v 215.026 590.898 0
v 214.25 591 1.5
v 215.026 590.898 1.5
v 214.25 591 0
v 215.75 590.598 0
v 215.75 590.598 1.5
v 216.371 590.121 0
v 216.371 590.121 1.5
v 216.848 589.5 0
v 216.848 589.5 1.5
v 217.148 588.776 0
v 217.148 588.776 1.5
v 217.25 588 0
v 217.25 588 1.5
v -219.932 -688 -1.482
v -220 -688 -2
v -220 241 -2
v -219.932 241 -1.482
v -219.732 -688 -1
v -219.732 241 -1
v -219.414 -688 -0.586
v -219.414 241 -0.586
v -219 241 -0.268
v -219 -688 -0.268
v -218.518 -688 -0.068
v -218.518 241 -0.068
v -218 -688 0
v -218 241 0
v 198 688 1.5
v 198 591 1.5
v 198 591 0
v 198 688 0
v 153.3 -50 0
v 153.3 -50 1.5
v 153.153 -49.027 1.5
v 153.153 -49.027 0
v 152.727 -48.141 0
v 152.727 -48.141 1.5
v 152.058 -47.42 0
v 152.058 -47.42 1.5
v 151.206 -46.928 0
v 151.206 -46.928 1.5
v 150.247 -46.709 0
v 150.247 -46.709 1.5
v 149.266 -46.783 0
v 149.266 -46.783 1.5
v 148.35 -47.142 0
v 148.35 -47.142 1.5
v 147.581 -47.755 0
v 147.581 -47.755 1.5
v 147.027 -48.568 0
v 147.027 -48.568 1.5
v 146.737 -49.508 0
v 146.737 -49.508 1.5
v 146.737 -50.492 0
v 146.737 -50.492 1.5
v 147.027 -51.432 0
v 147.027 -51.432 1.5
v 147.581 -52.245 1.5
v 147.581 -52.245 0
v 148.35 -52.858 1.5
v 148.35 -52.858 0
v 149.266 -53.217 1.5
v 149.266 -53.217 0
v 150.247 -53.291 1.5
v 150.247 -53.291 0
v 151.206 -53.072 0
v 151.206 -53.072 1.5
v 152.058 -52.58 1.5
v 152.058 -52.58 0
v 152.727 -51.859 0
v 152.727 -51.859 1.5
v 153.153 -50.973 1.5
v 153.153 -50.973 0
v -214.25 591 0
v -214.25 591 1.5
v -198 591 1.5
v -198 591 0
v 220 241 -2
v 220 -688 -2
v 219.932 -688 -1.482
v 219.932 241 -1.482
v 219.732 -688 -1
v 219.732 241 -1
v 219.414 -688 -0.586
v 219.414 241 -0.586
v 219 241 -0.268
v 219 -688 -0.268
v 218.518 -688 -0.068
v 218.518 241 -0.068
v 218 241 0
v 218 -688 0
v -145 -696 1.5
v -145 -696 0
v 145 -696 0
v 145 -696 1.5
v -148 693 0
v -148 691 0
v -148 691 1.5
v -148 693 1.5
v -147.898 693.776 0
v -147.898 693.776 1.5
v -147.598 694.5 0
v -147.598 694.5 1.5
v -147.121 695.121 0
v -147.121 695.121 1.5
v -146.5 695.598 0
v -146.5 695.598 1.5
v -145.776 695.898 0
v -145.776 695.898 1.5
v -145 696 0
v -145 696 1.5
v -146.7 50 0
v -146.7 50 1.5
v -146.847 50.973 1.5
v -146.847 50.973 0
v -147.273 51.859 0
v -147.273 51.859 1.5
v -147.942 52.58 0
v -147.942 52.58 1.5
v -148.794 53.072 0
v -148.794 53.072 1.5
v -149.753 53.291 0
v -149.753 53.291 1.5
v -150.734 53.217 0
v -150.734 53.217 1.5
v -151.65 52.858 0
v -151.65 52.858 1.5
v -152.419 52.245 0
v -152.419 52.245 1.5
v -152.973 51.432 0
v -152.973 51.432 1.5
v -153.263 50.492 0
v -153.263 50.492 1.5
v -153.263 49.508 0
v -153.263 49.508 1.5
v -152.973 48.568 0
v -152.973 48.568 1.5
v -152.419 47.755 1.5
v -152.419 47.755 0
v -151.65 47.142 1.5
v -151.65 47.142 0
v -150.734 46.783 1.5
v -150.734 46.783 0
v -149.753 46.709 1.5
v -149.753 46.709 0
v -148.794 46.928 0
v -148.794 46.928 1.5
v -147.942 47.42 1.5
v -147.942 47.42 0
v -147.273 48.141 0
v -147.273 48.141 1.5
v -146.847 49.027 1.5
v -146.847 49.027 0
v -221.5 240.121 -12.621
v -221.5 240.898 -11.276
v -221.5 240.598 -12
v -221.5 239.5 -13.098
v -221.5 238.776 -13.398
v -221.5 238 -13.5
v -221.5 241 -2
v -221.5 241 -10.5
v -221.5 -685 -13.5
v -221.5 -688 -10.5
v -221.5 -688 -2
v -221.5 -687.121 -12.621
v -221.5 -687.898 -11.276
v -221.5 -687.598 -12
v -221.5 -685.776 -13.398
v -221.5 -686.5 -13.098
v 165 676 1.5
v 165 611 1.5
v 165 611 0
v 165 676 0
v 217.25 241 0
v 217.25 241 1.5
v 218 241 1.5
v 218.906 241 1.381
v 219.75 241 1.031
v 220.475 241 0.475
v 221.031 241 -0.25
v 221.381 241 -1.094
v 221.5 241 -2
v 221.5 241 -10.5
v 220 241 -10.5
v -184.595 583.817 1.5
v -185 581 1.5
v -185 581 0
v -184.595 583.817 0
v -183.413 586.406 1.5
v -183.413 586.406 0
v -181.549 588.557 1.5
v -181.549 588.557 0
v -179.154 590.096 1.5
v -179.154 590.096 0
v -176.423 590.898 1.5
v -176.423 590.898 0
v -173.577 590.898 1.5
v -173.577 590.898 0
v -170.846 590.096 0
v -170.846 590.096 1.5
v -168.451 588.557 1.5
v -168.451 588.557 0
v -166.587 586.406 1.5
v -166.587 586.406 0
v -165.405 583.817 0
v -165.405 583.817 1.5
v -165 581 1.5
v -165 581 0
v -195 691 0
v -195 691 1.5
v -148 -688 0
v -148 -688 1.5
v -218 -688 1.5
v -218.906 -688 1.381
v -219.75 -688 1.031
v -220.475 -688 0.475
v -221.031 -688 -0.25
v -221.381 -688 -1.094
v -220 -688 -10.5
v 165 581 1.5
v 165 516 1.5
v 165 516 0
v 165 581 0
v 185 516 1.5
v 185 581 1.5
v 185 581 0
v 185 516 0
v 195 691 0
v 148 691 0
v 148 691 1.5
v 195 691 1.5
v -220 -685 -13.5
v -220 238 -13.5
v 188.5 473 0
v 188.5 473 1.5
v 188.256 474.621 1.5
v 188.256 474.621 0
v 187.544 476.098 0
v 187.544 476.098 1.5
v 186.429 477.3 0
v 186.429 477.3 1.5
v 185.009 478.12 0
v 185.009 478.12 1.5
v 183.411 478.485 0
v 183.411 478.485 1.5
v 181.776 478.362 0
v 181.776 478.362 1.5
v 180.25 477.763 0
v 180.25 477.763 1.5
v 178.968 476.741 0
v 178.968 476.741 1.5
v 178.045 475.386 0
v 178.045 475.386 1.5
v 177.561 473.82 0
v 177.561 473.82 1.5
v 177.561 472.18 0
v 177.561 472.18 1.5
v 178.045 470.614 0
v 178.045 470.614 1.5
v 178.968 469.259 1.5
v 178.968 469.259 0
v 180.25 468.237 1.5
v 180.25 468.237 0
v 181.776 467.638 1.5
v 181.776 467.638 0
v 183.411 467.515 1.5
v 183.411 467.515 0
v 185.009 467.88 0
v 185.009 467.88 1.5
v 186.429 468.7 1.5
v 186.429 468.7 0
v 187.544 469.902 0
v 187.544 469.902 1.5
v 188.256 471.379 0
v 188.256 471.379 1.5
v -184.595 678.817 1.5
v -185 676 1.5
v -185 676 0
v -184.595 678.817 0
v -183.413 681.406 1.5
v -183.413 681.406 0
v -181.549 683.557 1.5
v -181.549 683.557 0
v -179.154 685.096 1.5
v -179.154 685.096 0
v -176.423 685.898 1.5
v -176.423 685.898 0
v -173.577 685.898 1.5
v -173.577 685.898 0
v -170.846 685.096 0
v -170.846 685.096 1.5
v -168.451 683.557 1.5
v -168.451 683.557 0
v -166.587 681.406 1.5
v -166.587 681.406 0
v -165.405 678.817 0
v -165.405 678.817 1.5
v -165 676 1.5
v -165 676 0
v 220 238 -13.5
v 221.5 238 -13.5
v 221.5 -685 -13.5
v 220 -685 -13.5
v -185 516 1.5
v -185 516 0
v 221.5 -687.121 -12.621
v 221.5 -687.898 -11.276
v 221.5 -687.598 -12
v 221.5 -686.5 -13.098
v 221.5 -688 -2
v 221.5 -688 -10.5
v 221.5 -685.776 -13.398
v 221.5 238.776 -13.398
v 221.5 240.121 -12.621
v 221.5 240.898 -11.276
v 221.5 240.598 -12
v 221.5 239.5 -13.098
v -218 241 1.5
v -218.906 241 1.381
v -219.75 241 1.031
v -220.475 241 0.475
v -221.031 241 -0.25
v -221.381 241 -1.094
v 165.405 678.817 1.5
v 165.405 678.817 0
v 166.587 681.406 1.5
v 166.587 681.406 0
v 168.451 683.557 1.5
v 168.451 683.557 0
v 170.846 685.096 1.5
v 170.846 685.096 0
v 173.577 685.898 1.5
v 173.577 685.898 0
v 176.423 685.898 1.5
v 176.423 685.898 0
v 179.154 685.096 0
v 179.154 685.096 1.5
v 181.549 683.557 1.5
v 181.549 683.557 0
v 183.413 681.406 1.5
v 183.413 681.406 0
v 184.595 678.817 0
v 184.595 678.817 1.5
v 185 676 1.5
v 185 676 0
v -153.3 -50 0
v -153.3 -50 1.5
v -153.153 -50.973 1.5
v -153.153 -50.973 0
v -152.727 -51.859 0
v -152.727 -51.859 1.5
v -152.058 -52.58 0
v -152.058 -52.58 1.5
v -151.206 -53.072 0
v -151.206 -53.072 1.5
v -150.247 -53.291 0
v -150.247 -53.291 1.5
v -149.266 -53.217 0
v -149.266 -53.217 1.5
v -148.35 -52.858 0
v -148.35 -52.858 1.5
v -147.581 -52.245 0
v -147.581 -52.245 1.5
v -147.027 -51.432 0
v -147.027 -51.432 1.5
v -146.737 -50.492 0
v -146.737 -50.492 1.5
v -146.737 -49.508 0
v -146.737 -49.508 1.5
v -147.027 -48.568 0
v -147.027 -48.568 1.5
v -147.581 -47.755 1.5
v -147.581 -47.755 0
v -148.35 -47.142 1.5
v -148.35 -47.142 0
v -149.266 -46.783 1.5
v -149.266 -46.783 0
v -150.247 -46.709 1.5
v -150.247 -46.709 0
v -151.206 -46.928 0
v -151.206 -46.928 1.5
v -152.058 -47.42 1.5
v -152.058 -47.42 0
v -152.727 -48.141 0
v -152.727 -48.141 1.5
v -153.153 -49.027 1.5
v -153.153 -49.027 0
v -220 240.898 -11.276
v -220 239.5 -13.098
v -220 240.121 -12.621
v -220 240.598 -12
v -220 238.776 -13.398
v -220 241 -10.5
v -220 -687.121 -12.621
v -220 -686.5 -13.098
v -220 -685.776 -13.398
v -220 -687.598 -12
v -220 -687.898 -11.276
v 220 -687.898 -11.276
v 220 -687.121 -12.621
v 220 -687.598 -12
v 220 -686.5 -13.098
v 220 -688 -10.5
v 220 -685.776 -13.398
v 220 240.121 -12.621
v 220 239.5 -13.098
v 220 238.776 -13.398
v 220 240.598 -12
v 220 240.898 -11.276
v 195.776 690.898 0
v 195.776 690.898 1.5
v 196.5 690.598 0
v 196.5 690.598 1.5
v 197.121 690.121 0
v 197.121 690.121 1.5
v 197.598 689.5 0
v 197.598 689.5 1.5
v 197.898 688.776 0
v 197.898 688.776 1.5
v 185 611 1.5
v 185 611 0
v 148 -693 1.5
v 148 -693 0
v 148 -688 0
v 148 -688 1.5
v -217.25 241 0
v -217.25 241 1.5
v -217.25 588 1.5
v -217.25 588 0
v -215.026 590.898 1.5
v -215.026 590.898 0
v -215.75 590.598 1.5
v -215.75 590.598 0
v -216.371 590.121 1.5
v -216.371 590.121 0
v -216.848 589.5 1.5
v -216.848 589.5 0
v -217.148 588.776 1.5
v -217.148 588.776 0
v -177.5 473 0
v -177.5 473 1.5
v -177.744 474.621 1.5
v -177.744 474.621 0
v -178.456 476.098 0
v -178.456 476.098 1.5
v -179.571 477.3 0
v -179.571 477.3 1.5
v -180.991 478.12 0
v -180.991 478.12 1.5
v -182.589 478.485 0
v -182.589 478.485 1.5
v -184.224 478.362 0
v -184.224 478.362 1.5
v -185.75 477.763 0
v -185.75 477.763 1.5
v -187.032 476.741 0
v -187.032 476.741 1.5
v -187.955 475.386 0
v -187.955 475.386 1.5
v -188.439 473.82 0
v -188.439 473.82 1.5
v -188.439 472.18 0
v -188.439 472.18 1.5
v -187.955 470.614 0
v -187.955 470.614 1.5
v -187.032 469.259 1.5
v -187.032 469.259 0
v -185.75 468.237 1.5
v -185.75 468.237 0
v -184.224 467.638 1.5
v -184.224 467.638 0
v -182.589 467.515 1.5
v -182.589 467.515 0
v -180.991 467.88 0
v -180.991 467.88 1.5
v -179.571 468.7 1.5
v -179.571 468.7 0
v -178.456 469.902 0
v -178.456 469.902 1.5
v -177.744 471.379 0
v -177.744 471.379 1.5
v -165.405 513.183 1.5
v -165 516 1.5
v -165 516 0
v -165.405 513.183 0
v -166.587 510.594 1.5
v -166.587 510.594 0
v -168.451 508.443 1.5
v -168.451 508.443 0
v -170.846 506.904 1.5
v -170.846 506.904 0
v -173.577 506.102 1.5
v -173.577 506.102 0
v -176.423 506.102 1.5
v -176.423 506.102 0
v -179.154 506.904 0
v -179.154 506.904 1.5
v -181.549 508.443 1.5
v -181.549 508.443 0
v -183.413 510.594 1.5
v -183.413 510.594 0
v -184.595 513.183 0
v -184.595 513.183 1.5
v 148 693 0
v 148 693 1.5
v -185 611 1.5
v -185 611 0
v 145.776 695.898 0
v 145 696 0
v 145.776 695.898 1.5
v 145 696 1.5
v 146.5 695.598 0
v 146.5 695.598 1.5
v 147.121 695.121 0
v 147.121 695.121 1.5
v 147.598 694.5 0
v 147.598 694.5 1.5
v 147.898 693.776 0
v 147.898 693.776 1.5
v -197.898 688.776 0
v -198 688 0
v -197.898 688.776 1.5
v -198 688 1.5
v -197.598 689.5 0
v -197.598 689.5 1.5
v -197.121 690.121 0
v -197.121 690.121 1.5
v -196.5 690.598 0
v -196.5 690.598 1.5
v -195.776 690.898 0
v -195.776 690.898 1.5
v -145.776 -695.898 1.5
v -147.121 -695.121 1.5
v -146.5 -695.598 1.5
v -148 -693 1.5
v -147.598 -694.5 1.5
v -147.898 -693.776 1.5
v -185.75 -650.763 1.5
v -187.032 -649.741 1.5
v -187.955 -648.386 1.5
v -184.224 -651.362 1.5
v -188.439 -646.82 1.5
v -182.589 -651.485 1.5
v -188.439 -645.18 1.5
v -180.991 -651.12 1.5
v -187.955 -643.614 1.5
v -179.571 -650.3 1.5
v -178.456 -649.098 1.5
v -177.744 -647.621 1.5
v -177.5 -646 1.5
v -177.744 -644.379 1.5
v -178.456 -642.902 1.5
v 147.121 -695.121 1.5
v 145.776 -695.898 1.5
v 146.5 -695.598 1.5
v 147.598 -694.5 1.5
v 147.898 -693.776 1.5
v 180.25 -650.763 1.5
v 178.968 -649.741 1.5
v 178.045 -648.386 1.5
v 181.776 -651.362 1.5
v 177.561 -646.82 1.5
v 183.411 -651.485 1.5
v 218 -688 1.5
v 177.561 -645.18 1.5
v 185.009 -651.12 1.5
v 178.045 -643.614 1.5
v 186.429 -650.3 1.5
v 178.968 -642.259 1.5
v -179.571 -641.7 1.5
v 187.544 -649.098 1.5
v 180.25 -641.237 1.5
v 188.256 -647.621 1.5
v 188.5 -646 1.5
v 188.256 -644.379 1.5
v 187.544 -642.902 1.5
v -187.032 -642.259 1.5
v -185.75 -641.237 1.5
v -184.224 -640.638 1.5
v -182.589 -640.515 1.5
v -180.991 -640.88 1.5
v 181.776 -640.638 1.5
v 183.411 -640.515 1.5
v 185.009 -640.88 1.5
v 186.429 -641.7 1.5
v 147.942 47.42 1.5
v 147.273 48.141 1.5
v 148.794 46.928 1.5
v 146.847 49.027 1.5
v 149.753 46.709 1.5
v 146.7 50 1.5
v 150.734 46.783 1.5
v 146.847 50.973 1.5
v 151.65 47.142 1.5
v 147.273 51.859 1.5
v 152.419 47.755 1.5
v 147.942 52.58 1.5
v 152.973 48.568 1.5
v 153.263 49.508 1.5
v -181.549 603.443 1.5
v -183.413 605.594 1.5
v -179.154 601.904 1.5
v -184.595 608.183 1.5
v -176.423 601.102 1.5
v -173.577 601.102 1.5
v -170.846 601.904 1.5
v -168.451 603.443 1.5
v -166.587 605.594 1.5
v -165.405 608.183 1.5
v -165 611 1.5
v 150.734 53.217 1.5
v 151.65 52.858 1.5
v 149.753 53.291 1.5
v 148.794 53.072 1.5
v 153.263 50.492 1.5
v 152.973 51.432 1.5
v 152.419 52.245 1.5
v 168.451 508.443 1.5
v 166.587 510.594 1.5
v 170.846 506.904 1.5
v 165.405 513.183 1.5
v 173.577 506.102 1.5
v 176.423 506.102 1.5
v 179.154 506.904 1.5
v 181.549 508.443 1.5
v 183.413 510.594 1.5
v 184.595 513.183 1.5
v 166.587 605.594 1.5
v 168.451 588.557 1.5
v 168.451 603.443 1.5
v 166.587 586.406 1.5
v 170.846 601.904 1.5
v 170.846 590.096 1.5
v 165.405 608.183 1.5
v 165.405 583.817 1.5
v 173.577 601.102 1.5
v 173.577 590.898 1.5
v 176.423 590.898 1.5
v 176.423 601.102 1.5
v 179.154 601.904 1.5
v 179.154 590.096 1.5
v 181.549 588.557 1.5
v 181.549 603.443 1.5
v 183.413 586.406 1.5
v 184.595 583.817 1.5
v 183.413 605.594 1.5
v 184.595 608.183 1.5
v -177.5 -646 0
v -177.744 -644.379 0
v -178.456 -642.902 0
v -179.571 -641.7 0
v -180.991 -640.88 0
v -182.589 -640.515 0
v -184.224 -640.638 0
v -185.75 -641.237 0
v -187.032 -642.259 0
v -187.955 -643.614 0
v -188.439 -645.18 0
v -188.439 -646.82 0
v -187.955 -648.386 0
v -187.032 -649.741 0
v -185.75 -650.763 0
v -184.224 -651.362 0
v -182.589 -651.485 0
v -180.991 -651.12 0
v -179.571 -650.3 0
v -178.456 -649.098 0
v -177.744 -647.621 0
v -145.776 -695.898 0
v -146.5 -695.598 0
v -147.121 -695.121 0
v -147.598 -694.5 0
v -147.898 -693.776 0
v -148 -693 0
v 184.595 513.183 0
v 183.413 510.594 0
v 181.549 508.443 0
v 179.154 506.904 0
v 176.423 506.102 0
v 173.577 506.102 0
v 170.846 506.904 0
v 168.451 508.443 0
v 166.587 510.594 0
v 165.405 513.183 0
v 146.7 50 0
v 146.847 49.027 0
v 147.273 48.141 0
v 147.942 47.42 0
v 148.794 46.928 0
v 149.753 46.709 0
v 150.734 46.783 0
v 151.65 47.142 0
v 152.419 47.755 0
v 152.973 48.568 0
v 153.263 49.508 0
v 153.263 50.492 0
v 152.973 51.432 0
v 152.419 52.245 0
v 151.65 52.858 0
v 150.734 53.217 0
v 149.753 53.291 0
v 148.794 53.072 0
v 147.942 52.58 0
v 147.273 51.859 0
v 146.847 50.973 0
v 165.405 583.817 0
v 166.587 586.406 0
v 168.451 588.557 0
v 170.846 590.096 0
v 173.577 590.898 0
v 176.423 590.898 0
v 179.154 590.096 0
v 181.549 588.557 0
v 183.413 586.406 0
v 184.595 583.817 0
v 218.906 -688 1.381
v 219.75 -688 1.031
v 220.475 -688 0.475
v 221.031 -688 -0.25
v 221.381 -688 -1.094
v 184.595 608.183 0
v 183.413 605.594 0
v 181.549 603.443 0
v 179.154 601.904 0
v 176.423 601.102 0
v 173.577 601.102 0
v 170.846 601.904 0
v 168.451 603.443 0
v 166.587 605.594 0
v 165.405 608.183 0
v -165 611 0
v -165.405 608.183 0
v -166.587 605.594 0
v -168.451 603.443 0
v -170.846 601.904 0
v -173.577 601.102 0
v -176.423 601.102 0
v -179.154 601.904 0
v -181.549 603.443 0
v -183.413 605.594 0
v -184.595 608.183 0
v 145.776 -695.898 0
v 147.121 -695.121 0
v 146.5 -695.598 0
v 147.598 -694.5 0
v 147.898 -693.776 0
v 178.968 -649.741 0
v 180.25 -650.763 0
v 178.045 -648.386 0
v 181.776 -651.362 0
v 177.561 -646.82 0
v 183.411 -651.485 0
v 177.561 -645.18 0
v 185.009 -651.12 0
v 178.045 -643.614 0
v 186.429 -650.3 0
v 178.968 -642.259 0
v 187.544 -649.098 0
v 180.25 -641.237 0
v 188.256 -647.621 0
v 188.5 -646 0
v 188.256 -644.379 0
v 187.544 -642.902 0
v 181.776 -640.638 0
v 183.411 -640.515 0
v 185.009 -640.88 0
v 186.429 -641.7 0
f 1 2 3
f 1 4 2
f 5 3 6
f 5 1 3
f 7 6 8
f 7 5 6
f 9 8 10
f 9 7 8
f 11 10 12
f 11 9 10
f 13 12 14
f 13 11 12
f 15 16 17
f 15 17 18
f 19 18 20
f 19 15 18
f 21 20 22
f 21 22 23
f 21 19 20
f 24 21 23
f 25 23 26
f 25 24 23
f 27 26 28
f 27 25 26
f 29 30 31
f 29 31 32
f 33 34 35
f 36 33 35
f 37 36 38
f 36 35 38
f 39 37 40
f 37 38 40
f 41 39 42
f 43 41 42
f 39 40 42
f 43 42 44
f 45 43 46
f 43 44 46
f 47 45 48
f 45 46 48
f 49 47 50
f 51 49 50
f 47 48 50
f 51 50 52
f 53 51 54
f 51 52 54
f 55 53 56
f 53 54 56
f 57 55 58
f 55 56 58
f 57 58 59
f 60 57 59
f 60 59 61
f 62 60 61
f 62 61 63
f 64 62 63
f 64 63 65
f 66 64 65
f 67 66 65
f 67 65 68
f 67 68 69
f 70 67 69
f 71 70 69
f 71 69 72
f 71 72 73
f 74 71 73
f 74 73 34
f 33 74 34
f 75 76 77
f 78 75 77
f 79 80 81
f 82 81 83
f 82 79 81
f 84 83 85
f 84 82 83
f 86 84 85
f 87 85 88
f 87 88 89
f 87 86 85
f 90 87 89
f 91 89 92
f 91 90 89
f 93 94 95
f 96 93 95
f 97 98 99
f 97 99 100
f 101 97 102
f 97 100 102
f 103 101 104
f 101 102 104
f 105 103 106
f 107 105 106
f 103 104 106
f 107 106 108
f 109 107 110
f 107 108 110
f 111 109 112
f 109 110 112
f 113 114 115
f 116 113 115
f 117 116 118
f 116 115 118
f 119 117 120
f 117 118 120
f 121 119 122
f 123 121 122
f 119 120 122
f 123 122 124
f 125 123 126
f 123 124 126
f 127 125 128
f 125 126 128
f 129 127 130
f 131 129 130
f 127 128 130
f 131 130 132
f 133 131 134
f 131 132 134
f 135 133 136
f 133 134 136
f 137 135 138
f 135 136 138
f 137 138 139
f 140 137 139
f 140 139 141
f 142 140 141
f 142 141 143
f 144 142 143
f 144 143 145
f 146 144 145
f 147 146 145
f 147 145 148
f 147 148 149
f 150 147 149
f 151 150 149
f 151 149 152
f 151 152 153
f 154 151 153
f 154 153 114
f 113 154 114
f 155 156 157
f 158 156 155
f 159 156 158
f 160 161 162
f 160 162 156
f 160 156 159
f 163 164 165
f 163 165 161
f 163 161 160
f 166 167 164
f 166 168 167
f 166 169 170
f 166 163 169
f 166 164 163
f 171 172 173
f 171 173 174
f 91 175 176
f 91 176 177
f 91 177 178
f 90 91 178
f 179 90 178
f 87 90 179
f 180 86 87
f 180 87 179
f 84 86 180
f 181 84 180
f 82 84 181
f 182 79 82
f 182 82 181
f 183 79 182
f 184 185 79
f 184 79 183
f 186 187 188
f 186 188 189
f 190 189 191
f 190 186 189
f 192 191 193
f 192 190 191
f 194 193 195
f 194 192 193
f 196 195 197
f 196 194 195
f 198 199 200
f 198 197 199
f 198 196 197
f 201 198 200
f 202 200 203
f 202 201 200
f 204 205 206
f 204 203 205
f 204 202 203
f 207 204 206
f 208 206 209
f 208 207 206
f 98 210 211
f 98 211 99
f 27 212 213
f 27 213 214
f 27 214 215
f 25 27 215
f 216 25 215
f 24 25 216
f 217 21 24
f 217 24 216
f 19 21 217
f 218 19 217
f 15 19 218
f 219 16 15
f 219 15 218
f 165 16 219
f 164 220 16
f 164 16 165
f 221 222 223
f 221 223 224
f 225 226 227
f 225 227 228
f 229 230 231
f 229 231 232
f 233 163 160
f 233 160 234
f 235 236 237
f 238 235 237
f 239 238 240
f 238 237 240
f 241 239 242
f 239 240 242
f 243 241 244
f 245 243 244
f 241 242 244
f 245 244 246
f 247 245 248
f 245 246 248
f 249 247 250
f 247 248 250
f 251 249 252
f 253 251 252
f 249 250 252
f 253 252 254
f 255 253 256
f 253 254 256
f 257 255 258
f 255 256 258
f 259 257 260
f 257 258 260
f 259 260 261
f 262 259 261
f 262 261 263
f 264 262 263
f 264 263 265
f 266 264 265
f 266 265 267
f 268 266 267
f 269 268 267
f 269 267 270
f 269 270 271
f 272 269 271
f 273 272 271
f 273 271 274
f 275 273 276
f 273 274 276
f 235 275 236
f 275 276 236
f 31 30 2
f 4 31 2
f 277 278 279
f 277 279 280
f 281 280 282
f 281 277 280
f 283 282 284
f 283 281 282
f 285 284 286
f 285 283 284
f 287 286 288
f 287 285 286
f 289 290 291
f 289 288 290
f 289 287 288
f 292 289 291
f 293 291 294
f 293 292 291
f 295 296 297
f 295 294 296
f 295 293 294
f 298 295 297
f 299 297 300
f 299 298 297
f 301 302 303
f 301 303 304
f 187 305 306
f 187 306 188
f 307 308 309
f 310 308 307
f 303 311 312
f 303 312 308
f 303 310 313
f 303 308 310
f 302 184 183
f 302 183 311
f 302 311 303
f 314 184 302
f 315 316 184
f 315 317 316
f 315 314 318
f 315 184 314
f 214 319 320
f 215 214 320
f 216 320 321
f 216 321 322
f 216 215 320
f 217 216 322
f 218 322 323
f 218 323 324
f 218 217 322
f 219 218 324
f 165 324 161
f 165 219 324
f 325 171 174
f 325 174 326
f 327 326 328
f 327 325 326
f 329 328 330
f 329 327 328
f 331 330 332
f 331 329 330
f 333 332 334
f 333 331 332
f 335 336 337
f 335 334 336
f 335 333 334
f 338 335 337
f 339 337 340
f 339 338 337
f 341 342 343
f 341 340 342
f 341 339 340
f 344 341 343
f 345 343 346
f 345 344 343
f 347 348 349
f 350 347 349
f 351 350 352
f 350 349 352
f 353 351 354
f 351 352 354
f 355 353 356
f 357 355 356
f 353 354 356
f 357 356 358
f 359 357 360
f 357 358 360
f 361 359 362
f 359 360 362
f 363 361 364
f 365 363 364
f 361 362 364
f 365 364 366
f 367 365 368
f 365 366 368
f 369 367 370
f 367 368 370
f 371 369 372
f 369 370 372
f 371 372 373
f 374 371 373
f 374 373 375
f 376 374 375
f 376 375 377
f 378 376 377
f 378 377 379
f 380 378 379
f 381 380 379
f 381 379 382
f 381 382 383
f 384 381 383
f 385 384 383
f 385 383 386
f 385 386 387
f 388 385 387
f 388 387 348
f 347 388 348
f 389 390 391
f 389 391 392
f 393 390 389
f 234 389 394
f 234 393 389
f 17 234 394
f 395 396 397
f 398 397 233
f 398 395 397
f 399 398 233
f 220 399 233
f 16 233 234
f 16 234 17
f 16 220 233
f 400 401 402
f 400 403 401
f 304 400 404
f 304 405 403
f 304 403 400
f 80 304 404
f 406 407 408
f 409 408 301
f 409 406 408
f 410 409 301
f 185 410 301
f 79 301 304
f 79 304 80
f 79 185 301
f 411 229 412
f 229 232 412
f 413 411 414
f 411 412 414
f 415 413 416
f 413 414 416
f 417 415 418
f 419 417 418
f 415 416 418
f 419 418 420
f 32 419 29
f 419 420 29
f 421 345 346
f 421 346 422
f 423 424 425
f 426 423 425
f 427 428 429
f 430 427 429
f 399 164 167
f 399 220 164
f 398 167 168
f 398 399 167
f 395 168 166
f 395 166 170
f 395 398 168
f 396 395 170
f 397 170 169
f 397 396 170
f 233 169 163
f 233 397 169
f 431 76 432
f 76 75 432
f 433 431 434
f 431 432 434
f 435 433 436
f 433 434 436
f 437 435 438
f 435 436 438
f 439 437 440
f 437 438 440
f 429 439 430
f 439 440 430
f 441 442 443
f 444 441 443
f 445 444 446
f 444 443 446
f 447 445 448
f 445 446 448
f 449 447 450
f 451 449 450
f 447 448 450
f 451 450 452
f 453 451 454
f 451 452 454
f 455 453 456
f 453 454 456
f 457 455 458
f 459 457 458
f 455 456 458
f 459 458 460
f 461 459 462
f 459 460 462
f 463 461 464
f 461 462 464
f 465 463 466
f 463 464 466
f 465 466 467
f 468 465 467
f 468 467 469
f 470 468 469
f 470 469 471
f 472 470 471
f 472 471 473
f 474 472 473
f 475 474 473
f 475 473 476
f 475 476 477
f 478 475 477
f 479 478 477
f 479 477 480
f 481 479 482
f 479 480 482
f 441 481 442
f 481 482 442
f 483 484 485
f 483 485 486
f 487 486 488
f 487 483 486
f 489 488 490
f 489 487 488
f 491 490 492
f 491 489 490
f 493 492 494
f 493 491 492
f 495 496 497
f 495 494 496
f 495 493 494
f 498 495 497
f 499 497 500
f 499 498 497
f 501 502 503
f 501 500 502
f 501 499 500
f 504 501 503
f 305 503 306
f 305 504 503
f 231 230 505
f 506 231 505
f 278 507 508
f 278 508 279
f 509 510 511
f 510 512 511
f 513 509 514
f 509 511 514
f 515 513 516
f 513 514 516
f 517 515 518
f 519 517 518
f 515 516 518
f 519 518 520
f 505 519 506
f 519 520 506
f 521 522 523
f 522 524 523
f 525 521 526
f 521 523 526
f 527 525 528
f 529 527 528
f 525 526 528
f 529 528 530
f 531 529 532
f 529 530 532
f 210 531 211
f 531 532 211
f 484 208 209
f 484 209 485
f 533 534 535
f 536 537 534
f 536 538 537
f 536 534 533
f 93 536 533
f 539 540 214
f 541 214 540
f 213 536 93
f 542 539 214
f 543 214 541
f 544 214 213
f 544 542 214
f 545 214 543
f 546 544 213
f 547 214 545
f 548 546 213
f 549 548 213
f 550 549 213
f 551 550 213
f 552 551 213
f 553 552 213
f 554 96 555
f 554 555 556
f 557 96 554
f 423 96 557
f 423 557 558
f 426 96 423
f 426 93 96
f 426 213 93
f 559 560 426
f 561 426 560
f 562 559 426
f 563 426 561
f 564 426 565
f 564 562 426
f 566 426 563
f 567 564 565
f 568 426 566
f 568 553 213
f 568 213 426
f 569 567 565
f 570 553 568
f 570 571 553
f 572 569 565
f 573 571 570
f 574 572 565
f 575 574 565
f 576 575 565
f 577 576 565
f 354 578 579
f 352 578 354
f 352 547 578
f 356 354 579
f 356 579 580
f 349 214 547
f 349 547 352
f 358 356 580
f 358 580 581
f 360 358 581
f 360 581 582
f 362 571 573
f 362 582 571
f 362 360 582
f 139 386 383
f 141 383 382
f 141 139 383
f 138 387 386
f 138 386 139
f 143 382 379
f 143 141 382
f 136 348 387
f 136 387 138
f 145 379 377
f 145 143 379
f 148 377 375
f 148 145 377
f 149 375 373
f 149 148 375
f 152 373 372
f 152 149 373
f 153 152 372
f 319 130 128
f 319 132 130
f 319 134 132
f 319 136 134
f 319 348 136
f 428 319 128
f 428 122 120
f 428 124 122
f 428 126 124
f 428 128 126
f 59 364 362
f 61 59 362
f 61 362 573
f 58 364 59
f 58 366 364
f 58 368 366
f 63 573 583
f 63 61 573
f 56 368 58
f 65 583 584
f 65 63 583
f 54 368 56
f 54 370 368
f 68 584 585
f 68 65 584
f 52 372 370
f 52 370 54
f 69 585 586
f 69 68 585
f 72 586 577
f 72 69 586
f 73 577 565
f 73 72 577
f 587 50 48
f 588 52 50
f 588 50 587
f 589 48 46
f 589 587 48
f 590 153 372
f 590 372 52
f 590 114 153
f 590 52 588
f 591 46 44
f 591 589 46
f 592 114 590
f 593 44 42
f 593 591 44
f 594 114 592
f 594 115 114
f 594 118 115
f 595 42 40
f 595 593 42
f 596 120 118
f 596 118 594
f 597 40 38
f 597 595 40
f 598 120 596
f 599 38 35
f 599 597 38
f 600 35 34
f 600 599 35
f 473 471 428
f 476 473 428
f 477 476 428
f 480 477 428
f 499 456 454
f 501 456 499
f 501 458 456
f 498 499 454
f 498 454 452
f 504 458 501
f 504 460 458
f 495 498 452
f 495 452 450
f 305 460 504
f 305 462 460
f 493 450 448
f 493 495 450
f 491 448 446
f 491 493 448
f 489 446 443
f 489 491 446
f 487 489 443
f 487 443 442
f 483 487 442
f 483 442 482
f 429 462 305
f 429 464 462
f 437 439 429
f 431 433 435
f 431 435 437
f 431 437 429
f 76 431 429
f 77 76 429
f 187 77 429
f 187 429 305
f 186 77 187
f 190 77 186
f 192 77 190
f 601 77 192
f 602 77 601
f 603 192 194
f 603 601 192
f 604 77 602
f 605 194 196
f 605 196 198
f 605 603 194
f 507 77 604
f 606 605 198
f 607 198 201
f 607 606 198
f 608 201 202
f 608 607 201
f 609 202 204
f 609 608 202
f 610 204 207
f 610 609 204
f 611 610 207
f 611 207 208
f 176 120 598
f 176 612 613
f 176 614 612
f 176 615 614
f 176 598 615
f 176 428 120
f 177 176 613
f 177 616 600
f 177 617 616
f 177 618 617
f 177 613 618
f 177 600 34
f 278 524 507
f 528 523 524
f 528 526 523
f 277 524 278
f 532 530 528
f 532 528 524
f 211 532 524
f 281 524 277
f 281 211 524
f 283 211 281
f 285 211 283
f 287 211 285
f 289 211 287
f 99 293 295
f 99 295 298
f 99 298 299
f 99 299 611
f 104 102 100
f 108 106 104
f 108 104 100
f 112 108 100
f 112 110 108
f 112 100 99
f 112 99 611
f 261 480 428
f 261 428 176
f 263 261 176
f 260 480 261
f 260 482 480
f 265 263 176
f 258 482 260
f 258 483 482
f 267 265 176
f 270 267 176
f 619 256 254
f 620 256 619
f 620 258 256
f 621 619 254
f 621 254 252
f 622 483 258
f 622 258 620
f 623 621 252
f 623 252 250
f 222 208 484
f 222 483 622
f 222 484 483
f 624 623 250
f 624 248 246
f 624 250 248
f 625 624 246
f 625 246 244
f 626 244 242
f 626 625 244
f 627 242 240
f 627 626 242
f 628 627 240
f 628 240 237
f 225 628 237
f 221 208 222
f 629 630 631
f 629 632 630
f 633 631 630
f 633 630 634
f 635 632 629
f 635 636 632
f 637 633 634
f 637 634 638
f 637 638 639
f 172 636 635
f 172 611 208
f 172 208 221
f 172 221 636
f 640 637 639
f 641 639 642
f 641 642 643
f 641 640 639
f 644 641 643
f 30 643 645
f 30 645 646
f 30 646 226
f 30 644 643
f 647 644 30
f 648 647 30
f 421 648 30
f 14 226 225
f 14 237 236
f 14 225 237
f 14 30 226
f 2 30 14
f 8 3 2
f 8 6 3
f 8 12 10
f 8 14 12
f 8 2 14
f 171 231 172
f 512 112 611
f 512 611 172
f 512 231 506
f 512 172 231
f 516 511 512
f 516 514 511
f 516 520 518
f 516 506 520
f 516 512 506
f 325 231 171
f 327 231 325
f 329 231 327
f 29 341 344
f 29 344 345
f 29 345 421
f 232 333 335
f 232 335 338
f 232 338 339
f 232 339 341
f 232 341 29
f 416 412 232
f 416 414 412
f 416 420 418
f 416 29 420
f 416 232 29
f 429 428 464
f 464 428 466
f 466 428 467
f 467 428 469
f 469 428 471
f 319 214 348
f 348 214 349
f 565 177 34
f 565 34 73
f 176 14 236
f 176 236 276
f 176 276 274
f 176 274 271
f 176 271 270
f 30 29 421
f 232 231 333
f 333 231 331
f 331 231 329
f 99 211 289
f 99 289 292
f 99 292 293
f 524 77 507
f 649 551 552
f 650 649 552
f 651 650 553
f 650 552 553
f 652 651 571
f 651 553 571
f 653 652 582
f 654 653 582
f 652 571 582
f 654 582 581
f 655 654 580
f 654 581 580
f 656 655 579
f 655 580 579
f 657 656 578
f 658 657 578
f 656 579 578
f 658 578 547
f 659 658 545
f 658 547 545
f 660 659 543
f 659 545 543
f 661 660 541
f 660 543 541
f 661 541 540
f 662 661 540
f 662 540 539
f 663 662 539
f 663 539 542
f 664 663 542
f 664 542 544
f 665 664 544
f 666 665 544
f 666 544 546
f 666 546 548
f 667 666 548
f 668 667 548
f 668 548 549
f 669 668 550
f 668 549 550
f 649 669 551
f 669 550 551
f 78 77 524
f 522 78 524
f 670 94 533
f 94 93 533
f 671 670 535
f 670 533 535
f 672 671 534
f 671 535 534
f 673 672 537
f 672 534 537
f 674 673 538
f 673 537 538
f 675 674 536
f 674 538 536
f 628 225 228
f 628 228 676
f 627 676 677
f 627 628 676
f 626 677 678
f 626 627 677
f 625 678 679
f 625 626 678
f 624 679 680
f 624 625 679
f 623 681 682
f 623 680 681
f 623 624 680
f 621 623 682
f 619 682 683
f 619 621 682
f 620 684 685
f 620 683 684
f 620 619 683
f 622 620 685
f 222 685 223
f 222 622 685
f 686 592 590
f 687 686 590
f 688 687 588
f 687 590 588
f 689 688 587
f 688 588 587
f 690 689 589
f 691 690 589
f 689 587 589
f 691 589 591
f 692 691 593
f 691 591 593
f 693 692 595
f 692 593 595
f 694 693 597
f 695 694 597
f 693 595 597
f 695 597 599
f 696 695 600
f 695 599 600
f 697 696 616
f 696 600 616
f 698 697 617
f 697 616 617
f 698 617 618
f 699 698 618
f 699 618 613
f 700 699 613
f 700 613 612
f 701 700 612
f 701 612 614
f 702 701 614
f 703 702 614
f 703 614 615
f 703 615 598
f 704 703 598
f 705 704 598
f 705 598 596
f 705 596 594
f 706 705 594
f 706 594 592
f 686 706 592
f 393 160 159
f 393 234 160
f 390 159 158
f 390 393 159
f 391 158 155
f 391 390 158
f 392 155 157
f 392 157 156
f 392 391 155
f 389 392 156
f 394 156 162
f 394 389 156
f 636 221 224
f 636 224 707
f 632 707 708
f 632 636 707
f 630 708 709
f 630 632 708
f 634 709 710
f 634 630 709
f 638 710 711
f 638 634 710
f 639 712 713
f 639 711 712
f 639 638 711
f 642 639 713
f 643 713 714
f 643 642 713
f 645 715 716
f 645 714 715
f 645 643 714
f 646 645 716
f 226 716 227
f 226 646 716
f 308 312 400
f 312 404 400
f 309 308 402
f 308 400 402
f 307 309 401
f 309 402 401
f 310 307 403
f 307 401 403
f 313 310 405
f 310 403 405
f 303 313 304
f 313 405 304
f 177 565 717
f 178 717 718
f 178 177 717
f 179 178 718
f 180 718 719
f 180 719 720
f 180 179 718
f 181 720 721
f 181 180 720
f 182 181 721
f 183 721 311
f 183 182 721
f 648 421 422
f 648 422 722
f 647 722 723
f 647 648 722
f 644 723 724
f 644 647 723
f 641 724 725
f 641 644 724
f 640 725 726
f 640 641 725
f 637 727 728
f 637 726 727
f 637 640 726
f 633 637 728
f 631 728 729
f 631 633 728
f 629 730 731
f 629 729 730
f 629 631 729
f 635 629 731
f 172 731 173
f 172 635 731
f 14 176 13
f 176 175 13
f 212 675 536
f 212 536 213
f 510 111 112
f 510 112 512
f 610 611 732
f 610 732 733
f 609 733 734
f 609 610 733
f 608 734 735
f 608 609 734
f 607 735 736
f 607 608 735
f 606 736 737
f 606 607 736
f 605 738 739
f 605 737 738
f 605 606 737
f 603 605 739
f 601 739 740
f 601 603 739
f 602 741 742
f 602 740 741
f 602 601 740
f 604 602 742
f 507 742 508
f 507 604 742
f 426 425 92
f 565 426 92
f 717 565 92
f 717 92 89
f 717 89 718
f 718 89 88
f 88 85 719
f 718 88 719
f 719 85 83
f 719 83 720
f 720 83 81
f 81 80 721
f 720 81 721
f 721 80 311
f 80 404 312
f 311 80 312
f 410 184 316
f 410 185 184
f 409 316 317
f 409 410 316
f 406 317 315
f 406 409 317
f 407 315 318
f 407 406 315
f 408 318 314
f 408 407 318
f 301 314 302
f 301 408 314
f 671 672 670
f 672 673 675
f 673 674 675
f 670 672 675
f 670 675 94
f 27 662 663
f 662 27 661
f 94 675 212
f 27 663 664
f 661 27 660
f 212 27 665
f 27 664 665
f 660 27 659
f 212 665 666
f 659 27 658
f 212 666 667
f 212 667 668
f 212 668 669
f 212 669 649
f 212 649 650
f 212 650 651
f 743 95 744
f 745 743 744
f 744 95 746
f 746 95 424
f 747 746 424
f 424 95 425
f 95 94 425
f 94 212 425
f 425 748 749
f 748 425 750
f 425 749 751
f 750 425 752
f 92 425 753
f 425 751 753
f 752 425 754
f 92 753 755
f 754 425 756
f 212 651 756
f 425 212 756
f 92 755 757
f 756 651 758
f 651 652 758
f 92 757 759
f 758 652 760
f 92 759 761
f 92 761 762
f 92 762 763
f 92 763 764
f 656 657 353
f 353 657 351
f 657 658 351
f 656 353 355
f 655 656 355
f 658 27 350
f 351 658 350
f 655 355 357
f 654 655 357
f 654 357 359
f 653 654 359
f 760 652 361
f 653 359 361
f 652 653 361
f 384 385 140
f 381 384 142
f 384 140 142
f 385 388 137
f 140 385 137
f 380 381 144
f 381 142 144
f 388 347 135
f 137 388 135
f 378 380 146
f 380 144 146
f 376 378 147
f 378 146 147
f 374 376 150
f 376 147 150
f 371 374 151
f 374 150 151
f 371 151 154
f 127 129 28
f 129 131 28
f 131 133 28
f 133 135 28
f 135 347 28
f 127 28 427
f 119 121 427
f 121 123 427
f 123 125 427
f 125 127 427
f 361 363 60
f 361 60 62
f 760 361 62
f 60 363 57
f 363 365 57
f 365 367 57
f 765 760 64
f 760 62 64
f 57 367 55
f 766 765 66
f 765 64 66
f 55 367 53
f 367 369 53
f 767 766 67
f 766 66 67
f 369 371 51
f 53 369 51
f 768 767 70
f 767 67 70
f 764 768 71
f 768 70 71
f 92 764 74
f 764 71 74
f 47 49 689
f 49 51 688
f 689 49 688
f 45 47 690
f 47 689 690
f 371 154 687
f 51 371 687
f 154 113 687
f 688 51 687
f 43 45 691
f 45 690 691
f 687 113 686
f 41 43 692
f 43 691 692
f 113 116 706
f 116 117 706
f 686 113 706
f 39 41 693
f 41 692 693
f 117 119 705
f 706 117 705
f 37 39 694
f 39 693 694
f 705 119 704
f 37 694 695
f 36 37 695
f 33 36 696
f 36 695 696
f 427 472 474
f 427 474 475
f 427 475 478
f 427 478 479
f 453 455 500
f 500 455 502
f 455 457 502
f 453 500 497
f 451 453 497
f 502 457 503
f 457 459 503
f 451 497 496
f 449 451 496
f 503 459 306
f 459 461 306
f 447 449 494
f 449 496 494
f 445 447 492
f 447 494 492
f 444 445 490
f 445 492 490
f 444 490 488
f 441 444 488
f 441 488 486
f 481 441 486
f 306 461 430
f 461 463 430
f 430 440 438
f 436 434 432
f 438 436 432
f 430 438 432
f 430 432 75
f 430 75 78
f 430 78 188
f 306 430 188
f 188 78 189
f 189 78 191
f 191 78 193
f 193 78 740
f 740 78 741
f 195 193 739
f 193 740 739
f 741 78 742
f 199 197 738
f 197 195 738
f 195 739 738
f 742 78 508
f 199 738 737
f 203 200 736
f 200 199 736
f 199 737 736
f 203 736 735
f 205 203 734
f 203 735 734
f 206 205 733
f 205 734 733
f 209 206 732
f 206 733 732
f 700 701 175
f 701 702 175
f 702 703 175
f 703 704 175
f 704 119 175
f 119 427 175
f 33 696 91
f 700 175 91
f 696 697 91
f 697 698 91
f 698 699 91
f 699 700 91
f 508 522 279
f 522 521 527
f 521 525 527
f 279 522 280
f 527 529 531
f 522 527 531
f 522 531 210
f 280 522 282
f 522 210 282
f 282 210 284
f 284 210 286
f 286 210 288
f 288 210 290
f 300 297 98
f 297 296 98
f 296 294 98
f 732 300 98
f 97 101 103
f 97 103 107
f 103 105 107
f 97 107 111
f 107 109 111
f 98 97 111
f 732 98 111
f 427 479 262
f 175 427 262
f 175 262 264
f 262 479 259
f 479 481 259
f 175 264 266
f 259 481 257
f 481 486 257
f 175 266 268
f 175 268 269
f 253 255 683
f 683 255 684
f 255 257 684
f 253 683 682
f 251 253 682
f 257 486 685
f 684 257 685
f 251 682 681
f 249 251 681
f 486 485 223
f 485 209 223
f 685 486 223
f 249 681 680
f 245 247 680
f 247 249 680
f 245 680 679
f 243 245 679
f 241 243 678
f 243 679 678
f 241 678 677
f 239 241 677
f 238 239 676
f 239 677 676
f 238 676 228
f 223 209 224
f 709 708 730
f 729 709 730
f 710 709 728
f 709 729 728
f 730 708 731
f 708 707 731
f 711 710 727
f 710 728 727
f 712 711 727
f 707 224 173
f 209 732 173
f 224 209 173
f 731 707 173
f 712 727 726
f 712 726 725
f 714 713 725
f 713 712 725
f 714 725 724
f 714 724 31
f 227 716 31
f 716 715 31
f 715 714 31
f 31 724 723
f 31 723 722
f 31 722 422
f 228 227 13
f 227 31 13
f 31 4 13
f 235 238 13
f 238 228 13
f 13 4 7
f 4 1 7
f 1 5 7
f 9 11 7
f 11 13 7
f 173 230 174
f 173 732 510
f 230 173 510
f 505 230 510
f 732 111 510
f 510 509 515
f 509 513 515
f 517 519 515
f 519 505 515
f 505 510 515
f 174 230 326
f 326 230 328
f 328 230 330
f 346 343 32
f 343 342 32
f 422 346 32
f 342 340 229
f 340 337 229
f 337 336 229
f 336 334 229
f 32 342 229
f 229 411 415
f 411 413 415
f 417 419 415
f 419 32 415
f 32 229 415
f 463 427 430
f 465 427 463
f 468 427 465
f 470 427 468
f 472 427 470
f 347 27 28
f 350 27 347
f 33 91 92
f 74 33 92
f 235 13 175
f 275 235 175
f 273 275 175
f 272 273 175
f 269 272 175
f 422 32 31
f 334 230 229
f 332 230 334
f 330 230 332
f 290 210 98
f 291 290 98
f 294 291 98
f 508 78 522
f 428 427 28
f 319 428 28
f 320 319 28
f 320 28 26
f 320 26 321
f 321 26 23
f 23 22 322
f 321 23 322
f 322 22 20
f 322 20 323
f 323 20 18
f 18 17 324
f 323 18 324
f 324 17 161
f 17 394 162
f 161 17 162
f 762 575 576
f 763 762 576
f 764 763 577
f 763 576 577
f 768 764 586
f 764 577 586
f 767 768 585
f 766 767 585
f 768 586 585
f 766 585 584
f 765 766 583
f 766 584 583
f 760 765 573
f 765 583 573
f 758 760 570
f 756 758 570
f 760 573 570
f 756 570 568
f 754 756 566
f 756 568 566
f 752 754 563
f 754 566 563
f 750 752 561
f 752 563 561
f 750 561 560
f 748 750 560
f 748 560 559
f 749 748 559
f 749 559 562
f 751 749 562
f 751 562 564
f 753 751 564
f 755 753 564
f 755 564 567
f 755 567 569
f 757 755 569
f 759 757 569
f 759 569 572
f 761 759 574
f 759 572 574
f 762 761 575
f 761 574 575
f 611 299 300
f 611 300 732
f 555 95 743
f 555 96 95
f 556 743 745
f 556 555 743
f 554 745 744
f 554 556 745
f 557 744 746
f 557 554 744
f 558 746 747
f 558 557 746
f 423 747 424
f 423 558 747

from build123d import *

# Parameters (mm, degrees)
SKETCH_1_W                          = 440
SKETCH_1_H                          = 1392
EXTRUDE_1_DEPTH                     = 1.5
SKETCH_5_W                          = 22
SKETCH_5_H                          = 105
CUT_EXTRUDE_4_DEPTH                 = 5
SKETCH_2_R                          = 3.3
CUT_EXTRUDE_1813_DEPTH              = 10
CUT_EXTRUDE_2195_DEPTH              = 10
SKETCH_8_R                          = 5.5
CUT_EXTRUDE_3659_DEPTH              = 1.5
CUT_EXTRUDE_4343_DEPTH              = 730.944004702
CUT_EXTRUDE_4343_DEPTH_BACK         = 730.944004702
SKETCH_21_W                         = 72
SKETCH_21_H                         = 8
SKETCH_21_W_2                       = 50
SKETCH_21_H_2                       = 5
SM_EDGE_FLANGE_2_STRIP_W            = 10
SM_EDGE_FLANGE_2_STRIP_H            = 1.5
SM_EDGE_FLANGE_2_STRIP_CUT_DEPTH    = 929
SM_EDGE_FLANGE_2_RELIEF_W           = 10.75
SM_EDGE_FLANGE_2_RELIEF_H           = 0.75
SM_EDGE_FLANGE_2_RELIEF_CUT_DEPTH   = 1.5
SM_EDGE_FLANGE_2_STRIP_2_W          = 10
SM_EDGE_FLANGE_2_STRIP_2_H          = 1.5
SM_EDGE_FLANGE_2_STRIP_CUT_2_DEPTH  = 929
SM_EDGE_FLANGE_2_RELIEF_2_W         = 10.75
SM_EDGE_FLANGE_2_RELIEF_2_H         = 0.75
SM_EDGE_FLANGE_2_RELIEF_CUT_2_DEPTH = 1.5
SM_EDGE_FLANGE_2_DEPTH              = 929
SM_EDGE_FLANGE_2_BEND_DEPTH         = 929
SKETCH_32_W                         = 2.75
SKETCH_32_H                         = 349.25
CUT_EXTRUDE_7725_DEPTH              = 1.5
FILLET_5_R                          = 3


# Sheet-metal steps are written as plain solids
with BuildPart() as part:
    # Эскиз1 → Бобышка-Вытянуть1 (new body)
    with BuildSketch(Plane.XY):
        Rectangle(SKETCH_1_W, SKETCH_1_H)
    extrude(amount=EXTRUDE_1_DEPTH)

    # Эскиз5 → Вырез-Вытянуть4 (cut)
    with BuildSketch(Plane.XY.offset(1.5)):
        with Locations((-209, 643.5)):
            Rectangle(SKETCH_5_W, SKETCH_5_H)
        with Locations((209, 643.5)):
            Rectangle(SKETCH_5_W, SKETCH_5_H)
    extrude(amount=-CUT_EXTRUDE_4_DEPTH, mode=Mode.SUBTRACT)

    # Эскиз2 → Cut-Extrude 1813 (cut)
    with BuildSketch(Plane.XY.offset(1.5)):
        with Locations((-150, 50)):
            Circle(SKETCH_2_R)
        with Locations(Location((-150, -50, 0), (0, 0, 180))):
            Circle(SKETCH_2_R)
        with Locations((150, -50)):
            Circle(SKETCH_2_R)
        with Locations(Location((150, 50, 0), (0, 0, 180))):
            Circle(SKETCH_2_R)
    extrude(amount=-CUT_EXTRUDE_1813_DEPTH, mode=Mode.SUBTRACT)

    # Sketch 3 → Cut-Extrude 2195 (cut)
    with BuildSketch(Plane.XY.offset(1.5)):
        with BuildLine():
            Line((-185, 611), (-185, 676))
            ThreePointArc((-185, 676), (-175, 686), (-165, 676))
            Line((-165, 676), (-165, 611))
            ThreePointArc((-165, 611), (-175, 601), (-185, 611))
        make_face()
        with BuildLine():
            Line((-185, 516), (-185, 581))
            ThreePointArc((-185, 581), (-175, 591), (-165, 581))
            Line((-165, 581), (-165, 516))
            ThreePointArc((-165, 516), (-175, 506), (-185, 516))
        make_face()
        with BuildLine():
            Line((165, 516), (165, 581))
            ThreePointArc((165, 581), (175, 591), (185, 581))
            Line((185, 581), (185, 516))
            ThreePointArc((185, 516), (175, 506), (165, 516))
        make_face()
        with BuildLine():
            Line((165, 611), (165, 676))
            ThreePointArc((165, 676), (175, 686), (185, 676))
            Line((185, 676), (185, 611))
            ThreePointArc((185, 611), (175, 601), (165, 611))
        make_face()
    extrude(amount=-CUT_EXTRUDE_2195_DEPTH, mode=Mode.SUBTRACT)

    # Эскиз8 → Cut-Extrude 3659 (cut)
    with BuildSketch(Plane.XY.offset(1.5)):
        with Locations((183, -646)):
            Circle(SKETCH_8_R)
        with Locations((-183, -646)):
            Circle(SKETCH_8_R)
        with Locations((183, 473)):
            Circle(SKETCH_8_R)
        with Locations((-183, 473)):
            Circle(SKETCH_8_R)
    extrude(amount=-CUT_EXTRUDE_3659_DEPTH, mode=Mode.SUBTRACT)

    # Эскиз21 → Cut-Extrude 4343 (cut, two sides: drawn at the far end of the back side and taken through both)
    with BuildSketch(Plane.XY.offset(1.5).offset(-CUT_EXTRUDE_4343_DEPTH_BACK)):
        with Locations((-184, -692)):
            Rectangle(SKETCH_21_W, SKETCH_21_H)
        with Locations((-173, 693.5)):
            Rectangle(SKETCH_21_W_2, SKETCH_21_H_2)
        with Locations((184, -692)):
            Rectangle(SKETCH_21_W, SKETCH_21_H)
        with Locations((173, 693.5)):
            Rectangle(SKETCH_21_W_2, SKETCH_21_H_2)
    extrude(amount=CUT_EXTRUDE_4343_DEPTH + CUT_EXTRUDE_4343_DEPTH_BACK, mode=Mode.SUBTRACT)

    # Ребро-кромка2: sheet metal written as solids
    # Ребро-кромка2 strip (on a plane across the edge) → Ребро-кромка2 strip cut (cut)
    with BuildSketch(Plane(origin=(-220, -688, 0), x_dir=(1, 0, 0), z_dir=(0, 1, 0))):
        with Locations((-3, -0.75)):
            Rectangle(SM_EDGE_FLANGE_2_STRIP_W, SM_EDGE_FLANGE_2_STRIP_H)
    extrude(amount=SM_EDGE_FLANGE_2_STRIP_CUT_DEPTH, mode=Mode.SUBTRACT)

    # Ребро-кромка2 relief (on the sheet) → Ребро-кромка2 relief cut (cut)
    with BuildSketch(Plane(origin=(-218, -688, 0), x_dir=(1, 0, 0), z_dir=(0, 0, -1))):
        with Locations((-4.625, -929.375)):
            Rectangle(SM_EDGE_FLANGE_2_RELIEF_W, SM_EDGE_FLANGE_2_RELIEF_H)
    extrude(amount=-SM_EDGE_FLANGE_2_RELIEF_CUT_DEPTH, mode=Mode.SUBTRACT)

    # Ребро-кромка2 strip 2 (on a plane across the edge) → Ребро-кромка2 strip cut 2 (cut)
    with BuildSketch(Plane(origin=(220, 241, 0), x_dir=(-1, 0, 0), z_dir=(0, -1, 0))):
        with Locations((-3, -0.75)):
            Rectangle(SM_EDGE_FLANGE_2_STRIP_2_W, SM_EDGE_FLANGE_2_STRIP_2_H)
    extrude(amount=SM_EDGE_FLANGE_2_STRIP_CUT_2_DEPTH, mode=Mode.SUBTRACT)

    # Ребро-кромка2 relief 2 (on the sheet) → Ребро-кромка2 relief cut 2 (cut)
    with BuildSketch(Plane(origin=(218, 241, 0), x_dir=(-1, 0, 0), z_dir=(0, 0, -1))):
        with Locations((-4.625, 0.375)):
            Rectangle(SM_EDGE_FLANGE_2_RELIEF_2_W, SM_EDGE_FLANGE_2_RELIEF_2_H)
    extrude(amount=-SM_EDGE_FLANGE_2_RELIEF_CUT_2_DEPTH, mode=Mode.SUBTRACT)

    # Ребро-кромка2 section (on a plane across the edge) → Ребро-кромка2 (add)
    with BuildSketch(Plane(origin=(-220, -688, 0), x_dir=(1, 0, 0), z_dir=(0, 1, 0))):
        with BuildLine():
            Line((-1.5, 2), (-1.5, 13.5))
            Line((-1.5, 13.5), (0, 13.5))
            Line((0, 13.5), (0, 2))
            ThreePointArc((0, 2), (0.585786438, 0.585786438), (2, 0))
            Line((2, 0), (2, -1.5))
            ThreePointArc((2, -1.5), (-0.474873734, -0.474873734), (-1.5, 2))
        make_face()
    extrude(amount=SM_EDGE_FLANGE_2_DEPTH)

    # Ребро-кромка2 section 2 (on a plane across the edge) → Ребро-кромка2 bend (add)
    with BuildSketch(Plane(origin=(220, 241, 0), x_dir=(-1, 0, 0), z_dir=(0, -1, 0))):
        with BuildLine():
            Line((-1.5, 2), (-1.5, 13.5))
            Line((-1.5, 13.5), (0, 13.5))
            Line((0, 13.5), (0, 2))
            ThreePointArc((0, 2), (0.585786438, 0.585786438), (2, 0))
            Line((2, 0), (2, -1.5))
            ThreePointArc((2, -1.5), (-0.474873734, -0.474873734), (-1.5, 2))
        make_face()
    extrude(amount=SM_EDGE_FLANGE_2_BEND_DEPTH)

    # Эскиз32 → Cut-Extrude 7725 (cut)
    with BuildSketch(Plane.XY.offset(1.5)):
        with Locations((-218.625, 416.375)):
            Rectangle(SKETCH_32_W, SKETCH_32_H)
        with Locations((218.625, 416.375)):
            Rectangle(SKETCH_32_W, SKETCH_32_H)
    extrude(amount=-CUT_EXTRUDE_7725_DEPTH, mode=Mode.SUBTRACT)

    # Скругление5
    fillet_5_edges = [part.edges().sort_by_distance(p)[0] for p in [
        (-220.75, -688, -13.5),
        (-220.75, 241, -13.5),
        (220.75, 241, -13.5),
        (220.75, -688, -13.5),
        (-217.25, 591, 0.75),
        (217.25, 591, 0.75),
        (-148, 696, 0.75),
        (148, 696, 0.75),
        (198, 691, 0.75),
        (148, -696, 0.75),
        (-148, -696, 0.75),
        (-198, 691, 0.75),
    ]]
    fillet(fillet_5_edges, radius=FILLET_5_R)


solid = part.part
